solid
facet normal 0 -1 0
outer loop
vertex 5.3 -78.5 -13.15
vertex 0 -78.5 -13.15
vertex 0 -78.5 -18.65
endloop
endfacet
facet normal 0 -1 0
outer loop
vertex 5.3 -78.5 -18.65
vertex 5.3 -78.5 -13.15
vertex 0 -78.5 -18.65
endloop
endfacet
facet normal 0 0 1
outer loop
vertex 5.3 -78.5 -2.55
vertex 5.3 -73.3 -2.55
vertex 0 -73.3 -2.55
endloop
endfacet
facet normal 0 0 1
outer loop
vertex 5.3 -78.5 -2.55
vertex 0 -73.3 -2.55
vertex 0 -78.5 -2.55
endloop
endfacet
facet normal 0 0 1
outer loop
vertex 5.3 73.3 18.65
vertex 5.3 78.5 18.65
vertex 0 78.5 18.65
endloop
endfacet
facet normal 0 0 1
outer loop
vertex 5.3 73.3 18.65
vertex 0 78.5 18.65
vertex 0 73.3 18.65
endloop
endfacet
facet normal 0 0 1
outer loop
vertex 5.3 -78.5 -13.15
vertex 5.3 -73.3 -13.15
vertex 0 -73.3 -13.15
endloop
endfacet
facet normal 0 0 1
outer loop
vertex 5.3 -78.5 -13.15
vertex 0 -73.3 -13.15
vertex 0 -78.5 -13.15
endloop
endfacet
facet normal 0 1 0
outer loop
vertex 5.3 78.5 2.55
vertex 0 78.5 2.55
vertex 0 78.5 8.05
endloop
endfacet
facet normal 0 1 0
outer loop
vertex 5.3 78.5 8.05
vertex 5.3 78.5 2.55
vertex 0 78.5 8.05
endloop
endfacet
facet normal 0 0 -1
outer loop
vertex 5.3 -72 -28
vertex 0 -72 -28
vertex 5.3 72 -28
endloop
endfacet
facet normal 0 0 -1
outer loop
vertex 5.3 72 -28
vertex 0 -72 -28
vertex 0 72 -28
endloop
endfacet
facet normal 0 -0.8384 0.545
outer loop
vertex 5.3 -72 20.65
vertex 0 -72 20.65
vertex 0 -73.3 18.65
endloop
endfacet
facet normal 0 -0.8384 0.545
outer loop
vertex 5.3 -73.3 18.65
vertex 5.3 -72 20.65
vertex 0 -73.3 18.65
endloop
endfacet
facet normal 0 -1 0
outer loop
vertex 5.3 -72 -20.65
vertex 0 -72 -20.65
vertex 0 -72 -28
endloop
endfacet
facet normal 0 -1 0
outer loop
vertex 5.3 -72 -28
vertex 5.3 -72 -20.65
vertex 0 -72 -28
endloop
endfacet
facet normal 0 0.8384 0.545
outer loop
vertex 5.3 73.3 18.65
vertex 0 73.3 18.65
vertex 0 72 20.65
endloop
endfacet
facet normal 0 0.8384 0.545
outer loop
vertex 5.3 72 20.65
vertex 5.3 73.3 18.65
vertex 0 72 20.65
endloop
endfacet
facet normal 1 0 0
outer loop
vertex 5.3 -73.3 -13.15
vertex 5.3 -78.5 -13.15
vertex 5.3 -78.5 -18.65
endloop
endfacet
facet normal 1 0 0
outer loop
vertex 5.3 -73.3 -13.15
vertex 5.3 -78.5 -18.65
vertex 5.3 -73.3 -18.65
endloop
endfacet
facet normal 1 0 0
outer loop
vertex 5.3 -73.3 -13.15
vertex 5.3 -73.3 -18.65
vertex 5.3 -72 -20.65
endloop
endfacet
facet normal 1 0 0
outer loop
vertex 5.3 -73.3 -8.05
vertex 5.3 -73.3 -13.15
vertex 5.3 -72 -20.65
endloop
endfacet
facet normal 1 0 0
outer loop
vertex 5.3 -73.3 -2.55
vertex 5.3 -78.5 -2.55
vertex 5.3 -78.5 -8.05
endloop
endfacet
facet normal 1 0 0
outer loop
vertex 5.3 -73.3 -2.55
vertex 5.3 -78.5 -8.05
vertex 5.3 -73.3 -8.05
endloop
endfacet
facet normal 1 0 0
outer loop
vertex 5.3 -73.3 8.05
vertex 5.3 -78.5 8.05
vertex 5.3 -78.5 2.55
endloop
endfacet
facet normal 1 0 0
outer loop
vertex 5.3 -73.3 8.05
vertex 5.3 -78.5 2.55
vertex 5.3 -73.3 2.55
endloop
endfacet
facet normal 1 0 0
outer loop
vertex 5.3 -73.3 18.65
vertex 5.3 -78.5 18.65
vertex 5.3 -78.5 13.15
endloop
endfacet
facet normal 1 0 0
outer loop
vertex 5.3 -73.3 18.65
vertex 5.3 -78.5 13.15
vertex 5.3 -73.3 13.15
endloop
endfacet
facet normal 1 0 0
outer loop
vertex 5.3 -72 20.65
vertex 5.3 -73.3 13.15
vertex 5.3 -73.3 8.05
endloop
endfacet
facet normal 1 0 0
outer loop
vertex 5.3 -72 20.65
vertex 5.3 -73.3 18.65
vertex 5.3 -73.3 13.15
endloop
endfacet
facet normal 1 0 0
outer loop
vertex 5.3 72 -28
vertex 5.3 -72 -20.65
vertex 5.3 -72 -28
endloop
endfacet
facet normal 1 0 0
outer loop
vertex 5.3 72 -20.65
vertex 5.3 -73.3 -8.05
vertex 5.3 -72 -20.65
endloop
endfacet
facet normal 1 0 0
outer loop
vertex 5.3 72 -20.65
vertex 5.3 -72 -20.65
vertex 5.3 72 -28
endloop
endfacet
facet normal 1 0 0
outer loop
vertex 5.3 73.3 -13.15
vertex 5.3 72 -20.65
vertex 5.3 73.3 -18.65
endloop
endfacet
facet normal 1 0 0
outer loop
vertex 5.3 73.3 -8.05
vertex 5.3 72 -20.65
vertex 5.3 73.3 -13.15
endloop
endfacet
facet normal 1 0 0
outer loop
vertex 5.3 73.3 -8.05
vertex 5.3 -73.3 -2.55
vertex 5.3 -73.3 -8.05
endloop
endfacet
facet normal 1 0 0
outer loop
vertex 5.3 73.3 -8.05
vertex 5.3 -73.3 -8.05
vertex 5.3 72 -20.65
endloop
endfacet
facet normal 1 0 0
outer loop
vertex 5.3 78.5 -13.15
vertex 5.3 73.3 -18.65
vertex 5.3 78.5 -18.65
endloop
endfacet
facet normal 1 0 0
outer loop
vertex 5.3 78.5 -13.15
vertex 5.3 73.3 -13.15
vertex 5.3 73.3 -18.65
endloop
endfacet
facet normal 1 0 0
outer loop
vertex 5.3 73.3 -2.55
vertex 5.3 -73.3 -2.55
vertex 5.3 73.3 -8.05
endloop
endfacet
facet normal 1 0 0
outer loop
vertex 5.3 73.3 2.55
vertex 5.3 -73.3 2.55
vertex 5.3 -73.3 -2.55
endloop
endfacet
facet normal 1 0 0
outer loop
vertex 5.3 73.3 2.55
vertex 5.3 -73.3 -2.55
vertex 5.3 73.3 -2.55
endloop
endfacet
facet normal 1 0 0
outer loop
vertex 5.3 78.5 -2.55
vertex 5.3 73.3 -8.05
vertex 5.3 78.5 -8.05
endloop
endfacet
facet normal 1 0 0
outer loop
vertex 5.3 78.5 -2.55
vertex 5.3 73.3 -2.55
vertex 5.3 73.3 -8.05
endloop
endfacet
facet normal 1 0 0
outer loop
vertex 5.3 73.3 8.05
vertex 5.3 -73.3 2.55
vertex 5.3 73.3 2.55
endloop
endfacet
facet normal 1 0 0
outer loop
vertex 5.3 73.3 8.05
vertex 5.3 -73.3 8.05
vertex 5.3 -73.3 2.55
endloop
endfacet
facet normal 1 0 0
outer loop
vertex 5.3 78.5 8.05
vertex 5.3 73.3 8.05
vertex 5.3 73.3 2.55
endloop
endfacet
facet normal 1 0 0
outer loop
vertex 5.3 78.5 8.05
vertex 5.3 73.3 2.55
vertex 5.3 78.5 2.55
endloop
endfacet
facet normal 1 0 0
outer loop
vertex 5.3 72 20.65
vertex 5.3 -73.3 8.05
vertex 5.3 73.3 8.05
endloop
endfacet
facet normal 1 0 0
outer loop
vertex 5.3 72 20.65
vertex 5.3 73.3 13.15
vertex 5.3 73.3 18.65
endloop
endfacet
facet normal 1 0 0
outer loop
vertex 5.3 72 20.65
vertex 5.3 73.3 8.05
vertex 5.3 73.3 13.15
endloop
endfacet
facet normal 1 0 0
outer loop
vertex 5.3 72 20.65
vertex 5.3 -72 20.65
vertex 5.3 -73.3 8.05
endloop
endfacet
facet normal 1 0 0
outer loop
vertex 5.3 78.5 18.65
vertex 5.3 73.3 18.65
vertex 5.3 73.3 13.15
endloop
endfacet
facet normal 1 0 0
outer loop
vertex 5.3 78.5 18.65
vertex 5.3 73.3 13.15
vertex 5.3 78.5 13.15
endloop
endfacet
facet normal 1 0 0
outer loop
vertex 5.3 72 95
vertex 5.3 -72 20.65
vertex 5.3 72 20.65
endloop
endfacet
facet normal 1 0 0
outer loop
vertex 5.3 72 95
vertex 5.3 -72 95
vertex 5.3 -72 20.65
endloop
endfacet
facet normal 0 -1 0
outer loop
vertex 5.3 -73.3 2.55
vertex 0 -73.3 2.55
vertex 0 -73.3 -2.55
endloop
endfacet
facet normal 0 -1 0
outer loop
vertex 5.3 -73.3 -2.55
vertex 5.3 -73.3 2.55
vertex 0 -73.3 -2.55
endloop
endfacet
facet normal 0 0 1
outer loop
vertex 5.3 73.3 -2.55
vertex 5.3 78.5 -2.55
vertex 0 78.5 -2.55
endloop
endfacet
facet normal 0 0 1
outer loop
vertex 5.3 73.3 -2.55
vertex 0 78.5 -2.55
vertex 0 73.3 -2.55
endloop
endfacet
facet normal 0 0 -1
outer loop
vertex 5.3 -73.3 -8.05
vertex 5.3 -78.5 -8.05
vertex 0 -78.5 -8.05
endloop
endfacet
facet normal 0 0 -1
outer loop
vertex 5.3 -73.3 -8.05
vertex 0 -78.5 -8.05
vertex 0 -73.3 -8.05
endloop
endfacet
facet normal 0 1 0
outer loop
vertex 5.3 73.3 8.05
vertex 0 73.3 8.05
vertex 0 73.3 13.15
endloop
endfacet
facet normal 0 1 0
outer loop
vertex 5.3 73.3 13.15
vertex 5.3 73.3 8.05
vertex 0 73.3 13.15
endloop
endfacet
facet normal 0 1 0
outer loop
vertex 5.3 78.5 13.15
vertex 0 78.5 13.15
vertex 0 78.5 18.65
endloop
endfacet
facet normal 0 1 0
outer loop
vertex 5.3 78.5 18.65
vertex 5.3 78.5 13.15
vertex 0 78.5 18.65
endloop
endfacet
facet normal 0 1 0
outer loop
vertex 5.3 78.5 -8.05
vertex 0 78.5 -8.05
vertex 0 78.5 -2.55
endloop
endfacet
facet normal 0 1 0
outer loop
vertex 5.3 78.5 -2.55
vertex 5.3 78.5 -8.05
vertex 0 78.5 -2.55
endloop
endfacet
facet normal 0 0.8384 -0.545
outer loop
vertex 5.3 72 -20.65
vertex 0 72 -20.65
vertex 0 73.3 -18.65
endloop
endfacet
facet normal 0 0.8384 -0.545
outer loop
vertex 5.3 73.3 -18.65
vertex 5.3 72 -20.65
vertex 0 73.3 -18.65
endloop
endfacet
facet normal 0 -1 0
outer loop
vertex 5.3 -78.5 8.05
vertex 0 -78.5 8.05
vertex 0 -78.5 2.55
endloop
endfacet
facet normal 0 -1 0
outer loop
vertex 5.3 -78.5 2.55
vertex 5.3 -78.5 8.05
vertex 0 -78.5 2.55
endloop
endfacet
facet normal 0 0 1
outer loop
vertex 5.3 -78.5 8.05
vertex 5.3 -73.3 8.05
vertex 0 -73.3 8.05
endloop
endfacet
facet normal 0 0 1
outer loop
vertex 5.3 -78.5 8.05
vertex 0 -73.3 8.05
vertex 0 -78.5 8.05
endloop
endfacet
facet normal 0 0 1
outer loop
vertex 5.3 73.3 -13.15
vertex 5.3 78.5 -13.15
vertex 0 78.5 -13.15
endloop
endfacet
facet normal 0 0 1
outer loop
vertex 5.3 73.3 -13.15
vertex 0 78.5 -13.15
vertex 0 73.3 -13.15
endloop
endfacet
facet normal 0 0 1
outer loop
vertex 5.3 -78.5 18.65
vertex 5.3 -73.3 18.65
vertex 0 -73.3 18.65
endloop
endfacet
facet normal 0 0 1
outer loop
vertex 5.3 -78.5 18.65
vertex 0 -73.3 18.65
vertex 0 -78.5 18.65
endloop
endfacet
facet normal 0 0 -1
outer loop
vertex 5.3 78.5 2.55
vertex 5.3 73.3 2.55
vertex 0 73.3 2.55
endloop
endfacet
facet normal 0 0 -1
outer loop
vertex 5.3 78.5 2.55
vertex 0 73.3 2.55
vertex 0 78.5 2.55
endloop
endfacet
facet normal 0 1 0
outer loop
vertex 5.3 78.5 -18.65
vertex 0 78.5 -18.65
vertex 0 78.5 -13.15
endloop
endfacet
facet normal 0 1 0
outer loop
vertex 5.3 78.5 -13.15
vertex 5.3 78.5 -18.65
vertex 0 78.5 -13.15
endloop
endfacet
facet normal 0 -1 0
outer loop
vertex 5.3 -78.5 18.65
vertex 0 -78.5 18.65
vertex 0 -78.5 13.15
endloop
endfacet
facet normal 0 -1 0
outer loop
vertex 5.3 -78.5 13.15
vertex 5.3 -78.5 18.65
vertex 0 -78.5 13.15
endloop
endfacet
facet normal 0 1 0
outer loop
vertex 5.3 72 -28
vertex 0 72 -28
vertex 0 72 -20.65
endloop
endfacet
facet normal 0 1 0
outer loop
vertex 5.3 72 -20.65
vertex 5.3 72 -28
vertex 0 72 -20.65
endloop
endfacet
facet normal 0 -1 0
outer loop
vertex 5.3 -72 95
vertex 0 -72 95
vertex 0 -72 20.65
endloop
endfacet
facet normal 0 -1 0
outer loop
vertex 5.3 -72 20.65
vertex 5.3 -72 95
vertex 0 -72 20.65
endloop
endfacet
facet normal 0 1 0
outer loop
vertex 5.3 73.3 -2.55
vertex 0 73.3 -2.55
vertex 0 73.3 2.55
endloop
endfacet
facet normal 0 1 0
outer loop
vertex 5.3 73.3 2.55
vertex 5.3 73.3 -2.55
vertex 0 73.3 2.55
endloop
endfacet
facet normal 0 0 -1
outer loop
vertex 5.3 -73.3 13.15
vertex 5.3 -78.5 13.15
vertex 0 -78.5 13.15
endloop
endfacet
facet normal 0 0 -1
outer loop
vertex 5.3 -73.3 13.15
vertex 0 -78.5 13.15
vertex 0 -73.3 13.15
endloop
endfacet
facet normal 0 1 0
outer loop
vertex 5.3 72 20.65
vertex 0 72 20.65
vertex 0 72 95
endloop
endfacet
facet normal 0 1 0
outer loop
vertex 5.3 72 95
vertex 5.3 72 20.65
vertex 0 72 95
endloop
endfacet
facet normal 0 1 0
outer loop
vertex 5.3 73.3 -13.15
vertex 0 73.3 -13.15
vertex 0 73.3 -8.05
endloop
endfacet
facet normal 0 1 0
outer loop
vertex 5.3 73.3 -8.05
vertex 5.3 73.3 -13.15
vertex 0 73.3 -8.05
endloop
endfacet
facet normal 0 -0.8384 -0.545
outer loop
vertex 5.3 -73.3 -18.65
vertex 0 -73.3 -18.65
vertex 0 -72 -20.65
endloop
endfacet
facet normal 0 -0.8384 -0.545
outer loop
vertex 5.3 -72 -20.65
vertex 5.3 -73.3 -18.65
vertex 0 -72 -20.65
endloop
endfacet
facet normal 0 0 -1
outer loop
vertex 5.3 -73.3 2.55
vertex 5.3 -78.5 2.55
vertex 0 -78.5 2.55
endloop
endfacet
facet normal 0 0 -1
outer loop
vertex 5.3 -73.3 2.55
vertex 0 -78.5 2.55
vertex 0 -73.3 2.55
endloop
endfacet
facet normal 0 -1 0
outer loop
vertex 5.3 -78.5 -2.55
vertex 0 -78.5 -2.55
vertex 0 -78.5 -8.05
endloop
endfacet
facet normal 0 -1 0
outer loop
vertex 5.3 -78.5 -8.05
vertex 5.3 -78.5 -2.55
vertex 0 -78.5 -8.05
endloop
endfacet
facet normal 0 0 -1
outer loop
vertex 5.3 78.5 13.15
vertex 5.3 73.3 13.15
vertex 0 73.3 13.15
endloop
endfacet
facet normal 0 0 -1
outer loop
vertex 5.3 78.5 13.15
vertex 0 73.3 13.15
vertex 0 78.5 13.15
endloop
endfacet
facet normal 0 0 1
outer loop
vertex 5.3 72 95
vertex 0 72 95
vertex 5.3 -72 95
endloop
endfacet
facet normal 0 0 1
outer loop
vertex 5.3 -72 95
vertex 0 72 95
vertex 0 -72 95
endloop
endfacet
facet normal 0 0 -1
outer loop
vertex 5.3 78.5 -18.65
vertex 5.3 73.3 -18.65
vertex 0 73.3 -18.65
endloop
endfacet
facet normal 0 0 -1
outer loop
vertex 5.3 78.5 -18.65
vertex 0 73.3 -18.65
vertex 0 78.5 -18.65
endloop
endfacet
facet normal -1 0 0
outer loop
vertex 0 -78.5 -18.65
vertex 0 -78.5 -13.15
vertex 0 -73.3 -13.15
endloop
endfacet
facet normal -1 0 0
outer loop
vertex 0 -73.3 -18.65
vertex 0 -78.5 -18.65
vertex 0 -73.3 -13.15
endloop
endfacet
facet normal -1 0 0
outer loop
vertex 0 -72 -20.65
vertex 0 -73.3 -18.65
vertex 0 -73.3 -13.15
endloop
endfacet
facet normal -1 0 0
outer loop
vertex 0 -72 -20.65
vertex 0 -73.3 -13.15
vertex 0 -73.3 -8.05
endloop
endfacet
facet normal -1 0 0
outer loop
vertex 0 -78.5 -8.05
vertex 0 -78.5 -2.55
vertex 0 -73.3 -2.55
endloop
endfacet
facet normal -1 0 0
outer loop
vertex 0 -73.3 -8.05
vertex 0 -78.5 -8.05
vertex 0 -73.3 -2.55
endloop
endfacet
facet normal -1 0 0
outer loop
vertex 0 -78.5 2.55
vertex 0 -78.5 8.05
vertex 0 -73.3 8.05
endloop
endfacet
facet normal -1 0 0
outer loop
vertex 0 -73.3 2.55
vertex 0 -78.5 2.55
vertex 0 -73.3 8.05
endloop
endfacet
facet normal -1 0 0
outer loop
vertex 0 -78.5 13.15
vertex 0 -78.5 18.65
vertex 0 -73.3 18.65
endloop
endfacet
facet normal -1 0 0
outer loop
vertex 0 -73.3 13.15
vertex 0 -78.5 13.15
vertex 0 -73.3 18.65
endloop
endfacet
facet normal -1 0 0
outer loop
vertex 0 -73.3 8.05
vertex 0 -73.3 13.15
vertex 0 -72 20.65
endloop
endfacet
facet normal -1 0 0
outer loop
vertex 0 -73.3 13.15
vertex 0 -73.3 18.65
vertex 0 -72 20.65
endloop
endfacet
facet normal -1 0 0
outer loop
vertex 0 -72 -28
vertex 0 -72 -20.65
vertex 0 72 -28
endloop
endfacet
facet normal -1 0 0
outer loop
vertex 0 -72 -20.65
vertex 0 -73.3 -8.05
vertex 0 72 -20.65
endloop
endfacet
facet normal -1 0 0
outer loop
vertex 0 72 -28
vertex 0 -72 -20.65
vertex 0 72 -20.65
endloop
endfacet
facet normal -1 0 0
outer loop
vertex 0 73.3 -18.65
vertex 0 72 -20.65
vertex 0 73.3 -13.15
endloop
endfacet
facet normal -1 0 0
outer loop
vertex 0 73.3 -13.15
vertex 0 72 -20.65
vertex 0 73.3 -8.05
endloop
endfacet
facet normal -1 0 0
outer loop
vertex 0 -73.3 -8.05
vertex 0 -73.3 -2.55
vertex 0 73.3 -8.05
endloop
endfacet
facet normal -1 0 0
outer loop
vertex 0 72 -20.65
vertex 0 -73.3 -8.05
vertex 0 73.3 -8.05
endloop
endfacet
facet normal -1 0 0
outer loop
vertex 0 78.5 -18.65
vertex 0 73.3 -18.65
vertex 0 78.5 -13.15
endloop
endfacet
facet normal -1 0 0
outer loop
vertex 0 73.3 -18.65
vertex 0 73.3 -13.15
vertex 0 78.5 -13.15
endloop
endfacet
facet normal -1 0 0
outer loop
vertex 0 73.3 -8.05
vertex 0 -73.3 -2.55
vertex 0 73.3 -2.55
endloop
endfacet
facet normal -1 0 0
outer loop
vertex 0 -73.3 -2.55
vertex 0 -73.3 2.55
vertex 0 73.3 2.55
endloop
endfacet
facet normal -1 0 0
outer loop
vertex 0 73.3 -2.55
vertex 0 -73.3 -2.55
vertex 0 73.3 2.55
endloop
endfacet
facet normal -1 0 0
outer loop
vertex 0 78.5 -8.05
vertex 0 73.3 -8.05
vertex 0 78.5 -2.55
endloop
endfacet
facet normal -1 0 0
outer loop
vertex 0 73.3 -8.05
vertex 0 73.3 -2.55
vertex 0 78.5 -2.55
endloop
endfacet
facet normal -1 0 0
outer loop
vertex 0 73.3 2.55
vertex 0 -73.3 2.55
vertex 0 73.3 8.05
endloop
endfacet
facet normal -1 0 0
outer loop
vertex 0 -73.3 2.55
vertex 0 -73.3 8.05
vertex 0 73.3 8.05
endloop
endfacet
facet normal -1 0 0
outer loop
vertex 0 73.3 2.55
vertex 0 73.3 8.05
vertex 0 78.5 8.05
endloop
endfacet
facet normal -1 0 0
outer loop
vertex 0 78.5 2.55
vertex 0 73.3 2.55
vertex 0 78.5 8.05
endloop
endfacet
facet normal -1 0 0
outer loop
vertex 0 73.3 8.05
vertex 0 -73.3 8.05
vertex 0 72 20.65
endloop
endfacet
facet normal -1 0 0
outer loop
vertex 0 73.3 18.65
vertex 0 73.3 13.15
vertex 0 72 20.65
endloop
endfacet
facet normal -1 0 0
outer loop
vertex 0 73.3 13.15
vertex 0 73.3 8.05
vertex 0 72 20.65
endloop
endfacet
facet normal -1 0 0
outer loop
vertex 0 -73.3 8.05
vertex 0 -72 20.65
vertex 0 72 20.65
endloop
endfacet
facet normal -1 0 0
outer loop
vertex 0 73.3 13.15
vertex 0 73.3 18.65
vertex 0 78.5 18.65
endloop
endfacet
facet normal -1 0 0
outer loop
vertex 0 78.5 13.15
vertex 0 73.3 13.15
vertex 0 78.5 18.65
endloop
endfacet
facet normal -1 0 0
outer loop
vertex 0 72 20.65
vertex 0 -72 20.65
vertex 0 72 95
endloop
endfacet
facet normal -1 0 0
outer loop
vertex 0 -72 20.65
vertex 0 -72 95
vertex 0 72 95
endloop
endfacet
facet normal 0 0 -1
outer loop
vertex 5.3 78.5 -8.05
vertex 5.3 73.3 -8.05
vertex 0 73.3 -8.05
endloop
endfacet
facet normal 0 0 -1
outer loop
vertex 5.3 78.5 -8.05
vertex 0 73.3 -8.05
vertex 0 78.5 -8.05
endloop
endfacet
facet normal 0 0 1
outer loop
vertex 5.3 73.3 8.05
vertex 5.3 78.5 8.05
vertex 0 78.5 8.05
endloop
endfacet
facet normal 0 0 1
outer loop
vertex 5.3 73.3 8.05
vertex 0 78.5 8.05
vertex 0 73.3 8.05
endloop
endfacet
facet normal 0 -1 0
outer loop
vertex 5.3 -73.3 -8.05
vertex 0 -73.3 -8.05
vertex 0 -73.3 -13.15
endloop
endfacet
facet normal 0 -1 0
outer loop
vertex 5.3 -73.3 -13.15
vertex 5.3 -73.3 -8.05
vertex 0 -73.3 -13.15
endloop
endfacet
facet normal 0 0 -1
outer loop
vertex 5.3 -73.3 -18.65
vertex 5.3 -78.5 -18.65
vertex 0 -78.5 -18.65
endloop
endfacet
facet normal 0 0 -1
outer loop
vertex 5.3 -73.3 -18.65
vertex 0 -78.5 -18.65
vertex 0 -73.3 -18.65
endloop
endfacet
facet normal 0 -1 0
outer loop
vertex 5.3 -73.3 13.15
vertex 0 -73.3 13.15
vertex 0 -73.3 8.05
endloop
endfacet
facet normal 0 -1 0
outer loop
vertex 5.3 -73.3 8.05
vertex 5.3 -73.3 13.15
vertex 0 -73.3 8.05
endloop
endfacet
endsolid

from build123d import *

# Parameters (mm, degrees)
F1_DEPTH = 5.3


with BuildPart() as f1:
    # F0 (on Right) → F1 (new body)
    with BuildSketch(Plane.YZ):
        Polygon((-72, 20.65), (-73.3, 18.65), (-78.5, 18.65), (-78.5, 13.15), (-73.3, 13.15), (-73.3, 8.05), (-78.5, 8.05), (-78.5, 2.55), (-73.3, 2.55), (-73.3, -2.55), (-78.5, -2.55), (-78.5, -8.05), (-73.3, -8.05), (-73.3, -13.15), (-78.5, -13.15), (-78.5, -18.65), (-73.3, -18.65), (-72, -20.65), (-72, -28), (72, -28), (72, -20.65), (73.3, -18.65), (78.5, -18.65), (78.5, -13.15), (73.3, -13.15), (73.3, -8.05), (78.5, -8.05), (78.5, -2.55), (73.3, -2.55), (73.3, 2.55), (78.5, 2.55), (78.5, 8.05), (73.3, 8.05), (73.3, 13.15), (78.5, 13.15), (78.5, 18.65), (73.3, 18.65), (72, 20.65), (72, 95), (-72, 95), align=None)
    extrude(amount=F1_DEPTH)


solid = f1.part
